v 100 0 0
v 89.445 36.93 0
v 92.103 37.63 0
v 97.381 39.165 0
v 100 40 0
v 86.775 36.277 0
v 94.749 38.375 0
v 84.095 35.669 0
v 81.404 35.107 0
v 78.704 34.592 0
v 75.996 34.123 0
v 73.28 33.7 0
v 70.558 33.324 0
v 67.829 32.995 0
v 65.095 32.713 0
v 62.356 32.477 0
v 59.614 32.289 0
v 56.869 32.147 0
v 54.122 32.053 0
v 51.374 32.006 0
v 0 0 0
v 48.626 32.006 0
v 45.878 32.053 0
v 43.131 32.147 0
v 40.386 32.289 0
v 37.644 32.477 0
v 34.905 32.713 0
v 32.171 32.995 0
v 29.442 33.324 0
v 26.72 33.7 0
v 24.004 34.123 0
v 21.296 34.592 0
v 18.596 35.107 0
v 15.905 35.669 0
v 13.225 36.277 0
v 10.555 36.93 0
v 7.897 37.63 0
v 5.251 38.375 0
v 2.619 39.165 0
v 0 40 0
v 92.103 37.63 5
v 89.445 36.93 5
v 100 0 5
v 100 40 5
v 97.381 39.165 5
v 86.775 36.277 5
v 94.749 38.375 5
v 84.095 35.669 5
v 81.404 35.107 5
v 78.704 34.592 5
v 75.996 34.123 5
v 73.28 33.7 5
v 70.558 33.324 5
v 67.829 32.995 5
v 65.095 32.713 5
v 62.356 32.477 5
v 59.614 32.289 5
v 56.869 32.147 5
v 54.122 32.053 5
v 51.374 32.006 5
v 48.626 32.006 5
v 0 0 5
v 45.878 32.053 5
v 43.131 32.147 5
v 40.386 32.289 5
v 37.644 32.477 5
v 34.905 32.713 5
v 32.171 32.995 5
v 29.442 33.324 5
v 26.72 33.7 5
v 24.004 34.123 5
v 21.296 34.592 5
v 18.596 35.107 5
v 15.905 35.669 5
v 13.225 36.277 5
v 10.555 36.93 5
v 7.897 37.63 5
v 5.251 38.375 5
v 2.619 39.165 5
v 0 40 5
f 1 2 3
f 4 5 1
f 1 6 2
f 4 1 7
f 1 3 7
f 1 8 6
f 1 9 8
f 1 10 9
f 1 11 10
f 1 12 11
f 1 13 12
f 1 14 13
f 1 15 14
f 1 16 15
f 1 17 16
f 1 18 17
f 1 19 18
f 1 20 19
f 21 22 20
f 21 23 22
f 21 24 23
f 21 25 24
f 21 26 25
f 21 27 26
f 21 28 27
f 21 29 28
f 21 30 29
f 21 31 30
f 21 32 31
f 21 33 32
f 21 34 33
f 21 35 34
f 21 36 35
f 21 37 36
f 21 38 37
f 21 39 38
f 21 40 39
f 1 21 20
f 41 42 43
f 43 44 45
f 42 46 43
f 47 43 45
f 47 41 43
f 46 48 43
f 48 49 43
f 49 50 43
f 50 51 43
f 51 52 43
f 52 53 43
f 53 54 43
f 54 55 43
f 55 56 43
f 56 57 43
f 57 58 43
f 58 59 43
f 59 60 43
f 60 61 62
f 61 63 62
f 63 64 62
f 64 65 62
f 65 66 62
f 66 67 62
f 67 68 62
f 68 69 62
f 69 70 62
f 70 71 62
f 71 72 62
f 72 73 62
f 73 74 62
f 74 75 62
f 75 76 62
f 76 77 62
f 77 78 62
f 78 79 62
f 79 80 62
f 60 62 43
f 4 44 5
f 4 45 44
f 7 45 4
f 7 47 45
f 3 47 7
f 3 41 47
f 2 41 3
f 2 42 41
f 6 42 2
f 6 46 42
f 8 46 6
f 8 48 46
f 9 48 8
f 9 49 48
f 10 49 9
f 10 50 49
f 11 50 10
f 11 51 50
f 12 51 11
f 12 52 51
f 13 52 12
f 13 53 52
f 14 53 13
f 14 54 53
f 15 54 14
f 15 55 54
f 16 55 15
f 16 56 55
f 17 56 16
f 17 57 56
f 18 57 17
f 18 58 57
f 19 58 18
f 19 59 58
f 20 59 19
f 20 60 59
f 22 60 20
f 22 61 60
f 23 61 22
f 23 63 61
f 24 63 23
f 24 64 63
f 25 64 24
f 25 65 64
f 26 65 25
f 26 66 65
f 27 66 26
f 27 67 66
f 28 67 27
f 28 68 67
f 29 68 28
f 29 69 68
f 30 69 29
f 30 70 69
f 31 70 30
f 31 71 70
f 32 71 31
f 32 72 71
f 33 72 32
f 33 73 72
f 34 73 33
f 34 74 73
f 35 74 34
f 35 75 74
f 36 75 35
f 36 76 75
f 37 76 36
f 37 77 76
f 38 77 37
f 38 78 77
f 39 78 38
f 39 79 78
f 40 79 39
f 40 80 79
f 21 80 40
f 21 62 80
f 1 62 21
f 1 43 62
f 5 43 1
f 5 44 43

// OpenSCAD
$fn = 32;

// ----------------------------------------------------------------------
// Arc profile plate: notch, 40 points
// ----------------------------------------------------------------------

// --- parameters (mm) ---
bar_l = 100;              // bar length, X
bar_w = 40;               // bar width, Y
notch_depth = 8;          // depth of the arc notch at mid-span
arc_r = 160.25;           // radius of the notch arc
arc_angle = 36.36;        // notch arc angle, degrees
arc_step = 1;             // sampling step of the notch arc, degrees
plate_t = 5;              // plate thickness, Z

profile = [[0, 0], [100, 0], [100, 40], [97.381, 39.165], [94.749, 38.375], [92.103, 37.63], [89.445, 36.93], [86.775, 36.277], [84.095, 35.669], [81.404, 35.107], [78.704, 34.592], [75.996, 34.123], [73.28, 33.7], [70.558, 33.324], [67.829, 32.995], [65.095, 32.713], [62.356, 32.477], [59.614, 32.289], [56.869, 32.147], [54.122, 32.053], [51.374, 32.006], [48.626, 32.006], [45.878, 32.053], [43.131, 32.147], [40.386, 32.289], [37.644, 32.477], [34.905, 32.713], [32.171, 32.995], [29.442, 33.324], [26.72, 33.7], [24.004, 34.123], [21.296, 34.592], [18.596, 35.107], [15.905, 35.669], [13.225, 36.277], [10.555, 36.93], [7.897, 37.63], [5.251, 38.375], [2.619, 39.165], [0, 40]];  // primary outline, 40 points, counter clockwise

// --- the one profile operation ---
linear_extrude(height = plate_t) polygon(points = profile);
